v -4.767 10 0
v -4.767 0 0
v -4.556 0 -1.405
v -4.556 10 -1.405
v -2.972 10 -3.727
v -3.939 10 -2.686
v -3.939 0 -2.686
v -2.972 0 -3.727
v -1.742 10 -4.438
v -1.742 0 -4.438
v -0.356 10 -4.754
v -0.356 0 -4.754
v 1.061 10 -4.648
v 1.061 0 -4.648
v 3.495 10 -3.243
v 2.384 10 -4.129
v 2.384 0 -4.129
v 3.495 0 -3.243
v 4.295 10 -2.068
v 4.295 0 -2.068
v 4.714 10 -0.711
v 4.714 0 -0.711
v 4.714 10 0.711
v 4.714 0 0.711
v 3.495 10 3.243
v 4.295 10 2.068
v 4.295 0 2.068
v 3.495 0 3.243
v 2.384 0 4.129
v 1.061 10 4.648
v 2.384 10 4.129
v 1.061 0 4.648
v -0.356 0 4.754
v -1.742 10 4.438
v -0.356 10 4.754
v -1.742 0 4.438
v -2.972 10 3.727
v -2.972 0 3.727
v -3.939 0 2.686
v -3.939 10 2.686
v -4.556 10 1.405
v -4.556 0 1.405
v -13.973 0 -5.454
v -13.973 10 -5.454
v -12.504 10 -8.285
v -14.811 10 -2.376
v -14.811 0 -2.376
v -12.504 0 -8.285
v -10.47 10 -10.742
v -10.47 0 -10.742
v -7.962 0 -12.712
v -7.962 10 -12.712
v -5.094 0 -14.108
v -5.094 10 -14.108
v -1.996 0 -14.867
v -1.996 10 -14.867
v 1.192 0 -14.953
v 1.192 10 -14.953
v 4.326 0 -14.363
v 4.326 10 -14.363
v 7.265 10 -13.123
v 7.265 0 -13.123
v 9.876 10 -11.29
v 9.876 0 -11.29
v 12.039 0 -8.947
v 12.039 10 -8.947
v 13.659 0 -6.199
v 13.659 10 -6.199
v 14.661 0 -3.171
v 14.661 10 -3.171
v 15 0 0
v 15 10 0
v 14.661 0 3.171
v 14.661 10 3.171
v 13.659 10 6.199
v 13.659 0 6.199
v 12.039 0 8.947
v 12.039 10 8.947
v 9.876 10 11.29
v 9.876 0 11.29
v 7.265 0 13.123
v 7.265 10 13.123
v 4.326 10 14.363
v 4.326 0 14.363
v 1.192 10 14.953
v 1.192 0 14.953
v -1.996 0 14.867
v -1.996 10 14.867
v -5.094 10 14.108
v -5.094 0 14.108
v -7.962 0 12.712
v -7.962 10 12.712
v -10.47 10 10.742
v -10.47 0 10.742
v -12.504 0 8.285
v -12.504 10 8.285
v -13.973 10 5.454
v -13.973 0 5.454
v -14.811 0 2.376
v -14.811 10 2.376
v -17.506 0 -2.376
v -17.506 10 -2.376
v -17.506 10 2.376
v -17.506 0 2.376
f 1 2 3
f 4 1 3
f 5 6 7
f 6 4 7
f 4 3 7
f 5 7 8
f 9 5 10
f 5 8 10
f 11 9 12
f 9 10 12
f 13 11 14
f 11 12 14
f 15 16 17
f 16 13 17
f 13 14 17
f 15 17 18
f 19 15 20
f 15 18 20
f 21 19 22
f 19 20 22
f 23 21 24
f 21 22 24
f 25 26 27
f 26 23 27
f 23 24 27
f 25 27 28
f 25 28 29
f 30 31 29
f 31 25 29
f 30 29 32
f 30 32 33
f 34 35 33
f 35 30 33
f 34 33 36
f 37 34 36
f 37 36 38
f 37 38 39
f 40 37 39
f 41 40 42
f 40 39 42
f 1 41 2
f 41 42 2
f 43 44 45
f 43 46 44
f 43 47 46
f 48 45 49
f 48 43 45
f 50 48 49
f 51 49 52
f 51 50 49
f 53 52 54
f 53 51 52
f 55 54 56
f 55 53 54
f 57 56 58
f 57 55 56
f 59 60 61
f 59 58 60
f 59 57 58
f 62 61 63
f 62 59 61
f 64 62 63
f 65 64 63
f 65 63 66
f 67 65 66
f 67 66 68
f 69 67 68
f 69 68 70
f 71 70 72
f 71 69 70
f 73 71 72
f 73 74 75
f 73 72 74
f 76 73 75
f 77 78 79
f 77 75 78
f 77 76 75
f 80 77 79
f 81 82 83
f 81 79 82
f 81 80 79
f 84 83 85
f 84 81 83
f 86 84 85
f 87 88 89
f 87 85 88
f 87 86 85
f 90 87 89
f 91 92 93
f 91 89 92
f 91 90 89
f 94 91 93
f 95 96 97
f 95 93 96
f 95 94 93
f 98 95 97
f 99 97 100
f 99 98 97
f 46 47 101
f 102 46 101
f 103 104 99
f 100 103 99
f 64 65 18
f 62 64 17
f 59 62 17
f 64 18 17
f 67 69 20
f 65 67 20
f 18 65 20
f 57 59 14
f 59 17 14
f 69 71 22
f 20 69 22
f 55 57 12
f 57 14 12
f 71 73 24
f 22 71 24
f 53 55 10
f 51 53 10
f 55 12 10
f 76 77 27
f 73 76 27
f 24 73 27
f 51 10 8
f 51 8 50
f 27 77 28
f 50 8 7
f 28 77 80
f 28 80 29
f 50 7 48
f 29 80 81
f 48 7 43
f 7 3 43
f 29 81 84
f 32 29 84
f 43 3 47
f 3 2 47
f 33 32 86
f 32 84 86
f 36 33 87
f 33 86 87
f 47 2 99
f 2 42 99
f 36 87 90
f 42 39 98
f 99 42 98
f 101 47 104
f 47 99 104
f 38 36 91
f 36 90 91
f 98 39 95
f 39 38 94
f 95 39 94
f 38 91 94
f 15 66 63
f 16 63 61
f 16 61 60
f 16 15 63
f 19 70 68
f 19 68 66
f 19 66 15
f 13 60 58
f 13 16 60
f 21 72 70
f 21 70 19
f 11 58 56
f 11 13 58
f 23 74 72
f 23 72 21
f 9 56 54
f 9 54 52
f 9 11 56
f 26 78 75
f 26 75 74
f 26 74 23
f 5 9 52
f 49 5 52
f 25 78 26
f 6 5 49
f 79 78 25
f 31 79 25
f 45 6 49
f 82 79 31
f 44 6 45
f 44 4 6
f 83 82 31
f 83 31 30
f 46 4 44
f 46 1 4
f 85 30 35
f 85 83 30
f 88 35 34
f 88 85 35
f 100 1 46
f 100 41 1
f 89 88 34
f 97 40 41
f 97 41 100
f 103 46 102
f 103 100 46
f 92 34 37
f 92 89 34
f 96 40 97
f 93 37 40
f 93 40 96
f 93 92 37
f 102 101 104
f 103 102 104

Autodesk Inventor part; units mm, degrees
ref_plane "YZ Plane" through (0, 0, 0) normal (1, 0, 0) x (0, 1, 0)
ref_plane "XZ Plane" through (0, 0, 0) normal (0, 1, 0) x (-1, 0, 0)
ref_plane "XY Plane" through (0, 0, 0) normal (0, 0, 1) x (1, 0, 0)
sketch "Sketch1" plane through (0, 0, 0) normal (0, 1, 0) x (-1, 0, 0)
  circle A0 centre (0, 0) radius 4.7674
  circle A1 centre (0, 0) radius 15
  line L0 (14.8106, 2.3764) -> (14.8106, -2.3764)
  line L1 (14.8106, -2.3764) -> (17.5065, -2.3764)
  line L2 (17.5065, -2.3764) -> (17.5065, 2.3764)
  line L3 (17.5065, 2.3764) -> (14.8106, 2.3764)
  dimension "d0" = 30
  dimension "d1" = 9.5349
extrude "Extrusion1" add sketch "Sketch1" along normal blind 10
properties part number "Test_gear_p2"
